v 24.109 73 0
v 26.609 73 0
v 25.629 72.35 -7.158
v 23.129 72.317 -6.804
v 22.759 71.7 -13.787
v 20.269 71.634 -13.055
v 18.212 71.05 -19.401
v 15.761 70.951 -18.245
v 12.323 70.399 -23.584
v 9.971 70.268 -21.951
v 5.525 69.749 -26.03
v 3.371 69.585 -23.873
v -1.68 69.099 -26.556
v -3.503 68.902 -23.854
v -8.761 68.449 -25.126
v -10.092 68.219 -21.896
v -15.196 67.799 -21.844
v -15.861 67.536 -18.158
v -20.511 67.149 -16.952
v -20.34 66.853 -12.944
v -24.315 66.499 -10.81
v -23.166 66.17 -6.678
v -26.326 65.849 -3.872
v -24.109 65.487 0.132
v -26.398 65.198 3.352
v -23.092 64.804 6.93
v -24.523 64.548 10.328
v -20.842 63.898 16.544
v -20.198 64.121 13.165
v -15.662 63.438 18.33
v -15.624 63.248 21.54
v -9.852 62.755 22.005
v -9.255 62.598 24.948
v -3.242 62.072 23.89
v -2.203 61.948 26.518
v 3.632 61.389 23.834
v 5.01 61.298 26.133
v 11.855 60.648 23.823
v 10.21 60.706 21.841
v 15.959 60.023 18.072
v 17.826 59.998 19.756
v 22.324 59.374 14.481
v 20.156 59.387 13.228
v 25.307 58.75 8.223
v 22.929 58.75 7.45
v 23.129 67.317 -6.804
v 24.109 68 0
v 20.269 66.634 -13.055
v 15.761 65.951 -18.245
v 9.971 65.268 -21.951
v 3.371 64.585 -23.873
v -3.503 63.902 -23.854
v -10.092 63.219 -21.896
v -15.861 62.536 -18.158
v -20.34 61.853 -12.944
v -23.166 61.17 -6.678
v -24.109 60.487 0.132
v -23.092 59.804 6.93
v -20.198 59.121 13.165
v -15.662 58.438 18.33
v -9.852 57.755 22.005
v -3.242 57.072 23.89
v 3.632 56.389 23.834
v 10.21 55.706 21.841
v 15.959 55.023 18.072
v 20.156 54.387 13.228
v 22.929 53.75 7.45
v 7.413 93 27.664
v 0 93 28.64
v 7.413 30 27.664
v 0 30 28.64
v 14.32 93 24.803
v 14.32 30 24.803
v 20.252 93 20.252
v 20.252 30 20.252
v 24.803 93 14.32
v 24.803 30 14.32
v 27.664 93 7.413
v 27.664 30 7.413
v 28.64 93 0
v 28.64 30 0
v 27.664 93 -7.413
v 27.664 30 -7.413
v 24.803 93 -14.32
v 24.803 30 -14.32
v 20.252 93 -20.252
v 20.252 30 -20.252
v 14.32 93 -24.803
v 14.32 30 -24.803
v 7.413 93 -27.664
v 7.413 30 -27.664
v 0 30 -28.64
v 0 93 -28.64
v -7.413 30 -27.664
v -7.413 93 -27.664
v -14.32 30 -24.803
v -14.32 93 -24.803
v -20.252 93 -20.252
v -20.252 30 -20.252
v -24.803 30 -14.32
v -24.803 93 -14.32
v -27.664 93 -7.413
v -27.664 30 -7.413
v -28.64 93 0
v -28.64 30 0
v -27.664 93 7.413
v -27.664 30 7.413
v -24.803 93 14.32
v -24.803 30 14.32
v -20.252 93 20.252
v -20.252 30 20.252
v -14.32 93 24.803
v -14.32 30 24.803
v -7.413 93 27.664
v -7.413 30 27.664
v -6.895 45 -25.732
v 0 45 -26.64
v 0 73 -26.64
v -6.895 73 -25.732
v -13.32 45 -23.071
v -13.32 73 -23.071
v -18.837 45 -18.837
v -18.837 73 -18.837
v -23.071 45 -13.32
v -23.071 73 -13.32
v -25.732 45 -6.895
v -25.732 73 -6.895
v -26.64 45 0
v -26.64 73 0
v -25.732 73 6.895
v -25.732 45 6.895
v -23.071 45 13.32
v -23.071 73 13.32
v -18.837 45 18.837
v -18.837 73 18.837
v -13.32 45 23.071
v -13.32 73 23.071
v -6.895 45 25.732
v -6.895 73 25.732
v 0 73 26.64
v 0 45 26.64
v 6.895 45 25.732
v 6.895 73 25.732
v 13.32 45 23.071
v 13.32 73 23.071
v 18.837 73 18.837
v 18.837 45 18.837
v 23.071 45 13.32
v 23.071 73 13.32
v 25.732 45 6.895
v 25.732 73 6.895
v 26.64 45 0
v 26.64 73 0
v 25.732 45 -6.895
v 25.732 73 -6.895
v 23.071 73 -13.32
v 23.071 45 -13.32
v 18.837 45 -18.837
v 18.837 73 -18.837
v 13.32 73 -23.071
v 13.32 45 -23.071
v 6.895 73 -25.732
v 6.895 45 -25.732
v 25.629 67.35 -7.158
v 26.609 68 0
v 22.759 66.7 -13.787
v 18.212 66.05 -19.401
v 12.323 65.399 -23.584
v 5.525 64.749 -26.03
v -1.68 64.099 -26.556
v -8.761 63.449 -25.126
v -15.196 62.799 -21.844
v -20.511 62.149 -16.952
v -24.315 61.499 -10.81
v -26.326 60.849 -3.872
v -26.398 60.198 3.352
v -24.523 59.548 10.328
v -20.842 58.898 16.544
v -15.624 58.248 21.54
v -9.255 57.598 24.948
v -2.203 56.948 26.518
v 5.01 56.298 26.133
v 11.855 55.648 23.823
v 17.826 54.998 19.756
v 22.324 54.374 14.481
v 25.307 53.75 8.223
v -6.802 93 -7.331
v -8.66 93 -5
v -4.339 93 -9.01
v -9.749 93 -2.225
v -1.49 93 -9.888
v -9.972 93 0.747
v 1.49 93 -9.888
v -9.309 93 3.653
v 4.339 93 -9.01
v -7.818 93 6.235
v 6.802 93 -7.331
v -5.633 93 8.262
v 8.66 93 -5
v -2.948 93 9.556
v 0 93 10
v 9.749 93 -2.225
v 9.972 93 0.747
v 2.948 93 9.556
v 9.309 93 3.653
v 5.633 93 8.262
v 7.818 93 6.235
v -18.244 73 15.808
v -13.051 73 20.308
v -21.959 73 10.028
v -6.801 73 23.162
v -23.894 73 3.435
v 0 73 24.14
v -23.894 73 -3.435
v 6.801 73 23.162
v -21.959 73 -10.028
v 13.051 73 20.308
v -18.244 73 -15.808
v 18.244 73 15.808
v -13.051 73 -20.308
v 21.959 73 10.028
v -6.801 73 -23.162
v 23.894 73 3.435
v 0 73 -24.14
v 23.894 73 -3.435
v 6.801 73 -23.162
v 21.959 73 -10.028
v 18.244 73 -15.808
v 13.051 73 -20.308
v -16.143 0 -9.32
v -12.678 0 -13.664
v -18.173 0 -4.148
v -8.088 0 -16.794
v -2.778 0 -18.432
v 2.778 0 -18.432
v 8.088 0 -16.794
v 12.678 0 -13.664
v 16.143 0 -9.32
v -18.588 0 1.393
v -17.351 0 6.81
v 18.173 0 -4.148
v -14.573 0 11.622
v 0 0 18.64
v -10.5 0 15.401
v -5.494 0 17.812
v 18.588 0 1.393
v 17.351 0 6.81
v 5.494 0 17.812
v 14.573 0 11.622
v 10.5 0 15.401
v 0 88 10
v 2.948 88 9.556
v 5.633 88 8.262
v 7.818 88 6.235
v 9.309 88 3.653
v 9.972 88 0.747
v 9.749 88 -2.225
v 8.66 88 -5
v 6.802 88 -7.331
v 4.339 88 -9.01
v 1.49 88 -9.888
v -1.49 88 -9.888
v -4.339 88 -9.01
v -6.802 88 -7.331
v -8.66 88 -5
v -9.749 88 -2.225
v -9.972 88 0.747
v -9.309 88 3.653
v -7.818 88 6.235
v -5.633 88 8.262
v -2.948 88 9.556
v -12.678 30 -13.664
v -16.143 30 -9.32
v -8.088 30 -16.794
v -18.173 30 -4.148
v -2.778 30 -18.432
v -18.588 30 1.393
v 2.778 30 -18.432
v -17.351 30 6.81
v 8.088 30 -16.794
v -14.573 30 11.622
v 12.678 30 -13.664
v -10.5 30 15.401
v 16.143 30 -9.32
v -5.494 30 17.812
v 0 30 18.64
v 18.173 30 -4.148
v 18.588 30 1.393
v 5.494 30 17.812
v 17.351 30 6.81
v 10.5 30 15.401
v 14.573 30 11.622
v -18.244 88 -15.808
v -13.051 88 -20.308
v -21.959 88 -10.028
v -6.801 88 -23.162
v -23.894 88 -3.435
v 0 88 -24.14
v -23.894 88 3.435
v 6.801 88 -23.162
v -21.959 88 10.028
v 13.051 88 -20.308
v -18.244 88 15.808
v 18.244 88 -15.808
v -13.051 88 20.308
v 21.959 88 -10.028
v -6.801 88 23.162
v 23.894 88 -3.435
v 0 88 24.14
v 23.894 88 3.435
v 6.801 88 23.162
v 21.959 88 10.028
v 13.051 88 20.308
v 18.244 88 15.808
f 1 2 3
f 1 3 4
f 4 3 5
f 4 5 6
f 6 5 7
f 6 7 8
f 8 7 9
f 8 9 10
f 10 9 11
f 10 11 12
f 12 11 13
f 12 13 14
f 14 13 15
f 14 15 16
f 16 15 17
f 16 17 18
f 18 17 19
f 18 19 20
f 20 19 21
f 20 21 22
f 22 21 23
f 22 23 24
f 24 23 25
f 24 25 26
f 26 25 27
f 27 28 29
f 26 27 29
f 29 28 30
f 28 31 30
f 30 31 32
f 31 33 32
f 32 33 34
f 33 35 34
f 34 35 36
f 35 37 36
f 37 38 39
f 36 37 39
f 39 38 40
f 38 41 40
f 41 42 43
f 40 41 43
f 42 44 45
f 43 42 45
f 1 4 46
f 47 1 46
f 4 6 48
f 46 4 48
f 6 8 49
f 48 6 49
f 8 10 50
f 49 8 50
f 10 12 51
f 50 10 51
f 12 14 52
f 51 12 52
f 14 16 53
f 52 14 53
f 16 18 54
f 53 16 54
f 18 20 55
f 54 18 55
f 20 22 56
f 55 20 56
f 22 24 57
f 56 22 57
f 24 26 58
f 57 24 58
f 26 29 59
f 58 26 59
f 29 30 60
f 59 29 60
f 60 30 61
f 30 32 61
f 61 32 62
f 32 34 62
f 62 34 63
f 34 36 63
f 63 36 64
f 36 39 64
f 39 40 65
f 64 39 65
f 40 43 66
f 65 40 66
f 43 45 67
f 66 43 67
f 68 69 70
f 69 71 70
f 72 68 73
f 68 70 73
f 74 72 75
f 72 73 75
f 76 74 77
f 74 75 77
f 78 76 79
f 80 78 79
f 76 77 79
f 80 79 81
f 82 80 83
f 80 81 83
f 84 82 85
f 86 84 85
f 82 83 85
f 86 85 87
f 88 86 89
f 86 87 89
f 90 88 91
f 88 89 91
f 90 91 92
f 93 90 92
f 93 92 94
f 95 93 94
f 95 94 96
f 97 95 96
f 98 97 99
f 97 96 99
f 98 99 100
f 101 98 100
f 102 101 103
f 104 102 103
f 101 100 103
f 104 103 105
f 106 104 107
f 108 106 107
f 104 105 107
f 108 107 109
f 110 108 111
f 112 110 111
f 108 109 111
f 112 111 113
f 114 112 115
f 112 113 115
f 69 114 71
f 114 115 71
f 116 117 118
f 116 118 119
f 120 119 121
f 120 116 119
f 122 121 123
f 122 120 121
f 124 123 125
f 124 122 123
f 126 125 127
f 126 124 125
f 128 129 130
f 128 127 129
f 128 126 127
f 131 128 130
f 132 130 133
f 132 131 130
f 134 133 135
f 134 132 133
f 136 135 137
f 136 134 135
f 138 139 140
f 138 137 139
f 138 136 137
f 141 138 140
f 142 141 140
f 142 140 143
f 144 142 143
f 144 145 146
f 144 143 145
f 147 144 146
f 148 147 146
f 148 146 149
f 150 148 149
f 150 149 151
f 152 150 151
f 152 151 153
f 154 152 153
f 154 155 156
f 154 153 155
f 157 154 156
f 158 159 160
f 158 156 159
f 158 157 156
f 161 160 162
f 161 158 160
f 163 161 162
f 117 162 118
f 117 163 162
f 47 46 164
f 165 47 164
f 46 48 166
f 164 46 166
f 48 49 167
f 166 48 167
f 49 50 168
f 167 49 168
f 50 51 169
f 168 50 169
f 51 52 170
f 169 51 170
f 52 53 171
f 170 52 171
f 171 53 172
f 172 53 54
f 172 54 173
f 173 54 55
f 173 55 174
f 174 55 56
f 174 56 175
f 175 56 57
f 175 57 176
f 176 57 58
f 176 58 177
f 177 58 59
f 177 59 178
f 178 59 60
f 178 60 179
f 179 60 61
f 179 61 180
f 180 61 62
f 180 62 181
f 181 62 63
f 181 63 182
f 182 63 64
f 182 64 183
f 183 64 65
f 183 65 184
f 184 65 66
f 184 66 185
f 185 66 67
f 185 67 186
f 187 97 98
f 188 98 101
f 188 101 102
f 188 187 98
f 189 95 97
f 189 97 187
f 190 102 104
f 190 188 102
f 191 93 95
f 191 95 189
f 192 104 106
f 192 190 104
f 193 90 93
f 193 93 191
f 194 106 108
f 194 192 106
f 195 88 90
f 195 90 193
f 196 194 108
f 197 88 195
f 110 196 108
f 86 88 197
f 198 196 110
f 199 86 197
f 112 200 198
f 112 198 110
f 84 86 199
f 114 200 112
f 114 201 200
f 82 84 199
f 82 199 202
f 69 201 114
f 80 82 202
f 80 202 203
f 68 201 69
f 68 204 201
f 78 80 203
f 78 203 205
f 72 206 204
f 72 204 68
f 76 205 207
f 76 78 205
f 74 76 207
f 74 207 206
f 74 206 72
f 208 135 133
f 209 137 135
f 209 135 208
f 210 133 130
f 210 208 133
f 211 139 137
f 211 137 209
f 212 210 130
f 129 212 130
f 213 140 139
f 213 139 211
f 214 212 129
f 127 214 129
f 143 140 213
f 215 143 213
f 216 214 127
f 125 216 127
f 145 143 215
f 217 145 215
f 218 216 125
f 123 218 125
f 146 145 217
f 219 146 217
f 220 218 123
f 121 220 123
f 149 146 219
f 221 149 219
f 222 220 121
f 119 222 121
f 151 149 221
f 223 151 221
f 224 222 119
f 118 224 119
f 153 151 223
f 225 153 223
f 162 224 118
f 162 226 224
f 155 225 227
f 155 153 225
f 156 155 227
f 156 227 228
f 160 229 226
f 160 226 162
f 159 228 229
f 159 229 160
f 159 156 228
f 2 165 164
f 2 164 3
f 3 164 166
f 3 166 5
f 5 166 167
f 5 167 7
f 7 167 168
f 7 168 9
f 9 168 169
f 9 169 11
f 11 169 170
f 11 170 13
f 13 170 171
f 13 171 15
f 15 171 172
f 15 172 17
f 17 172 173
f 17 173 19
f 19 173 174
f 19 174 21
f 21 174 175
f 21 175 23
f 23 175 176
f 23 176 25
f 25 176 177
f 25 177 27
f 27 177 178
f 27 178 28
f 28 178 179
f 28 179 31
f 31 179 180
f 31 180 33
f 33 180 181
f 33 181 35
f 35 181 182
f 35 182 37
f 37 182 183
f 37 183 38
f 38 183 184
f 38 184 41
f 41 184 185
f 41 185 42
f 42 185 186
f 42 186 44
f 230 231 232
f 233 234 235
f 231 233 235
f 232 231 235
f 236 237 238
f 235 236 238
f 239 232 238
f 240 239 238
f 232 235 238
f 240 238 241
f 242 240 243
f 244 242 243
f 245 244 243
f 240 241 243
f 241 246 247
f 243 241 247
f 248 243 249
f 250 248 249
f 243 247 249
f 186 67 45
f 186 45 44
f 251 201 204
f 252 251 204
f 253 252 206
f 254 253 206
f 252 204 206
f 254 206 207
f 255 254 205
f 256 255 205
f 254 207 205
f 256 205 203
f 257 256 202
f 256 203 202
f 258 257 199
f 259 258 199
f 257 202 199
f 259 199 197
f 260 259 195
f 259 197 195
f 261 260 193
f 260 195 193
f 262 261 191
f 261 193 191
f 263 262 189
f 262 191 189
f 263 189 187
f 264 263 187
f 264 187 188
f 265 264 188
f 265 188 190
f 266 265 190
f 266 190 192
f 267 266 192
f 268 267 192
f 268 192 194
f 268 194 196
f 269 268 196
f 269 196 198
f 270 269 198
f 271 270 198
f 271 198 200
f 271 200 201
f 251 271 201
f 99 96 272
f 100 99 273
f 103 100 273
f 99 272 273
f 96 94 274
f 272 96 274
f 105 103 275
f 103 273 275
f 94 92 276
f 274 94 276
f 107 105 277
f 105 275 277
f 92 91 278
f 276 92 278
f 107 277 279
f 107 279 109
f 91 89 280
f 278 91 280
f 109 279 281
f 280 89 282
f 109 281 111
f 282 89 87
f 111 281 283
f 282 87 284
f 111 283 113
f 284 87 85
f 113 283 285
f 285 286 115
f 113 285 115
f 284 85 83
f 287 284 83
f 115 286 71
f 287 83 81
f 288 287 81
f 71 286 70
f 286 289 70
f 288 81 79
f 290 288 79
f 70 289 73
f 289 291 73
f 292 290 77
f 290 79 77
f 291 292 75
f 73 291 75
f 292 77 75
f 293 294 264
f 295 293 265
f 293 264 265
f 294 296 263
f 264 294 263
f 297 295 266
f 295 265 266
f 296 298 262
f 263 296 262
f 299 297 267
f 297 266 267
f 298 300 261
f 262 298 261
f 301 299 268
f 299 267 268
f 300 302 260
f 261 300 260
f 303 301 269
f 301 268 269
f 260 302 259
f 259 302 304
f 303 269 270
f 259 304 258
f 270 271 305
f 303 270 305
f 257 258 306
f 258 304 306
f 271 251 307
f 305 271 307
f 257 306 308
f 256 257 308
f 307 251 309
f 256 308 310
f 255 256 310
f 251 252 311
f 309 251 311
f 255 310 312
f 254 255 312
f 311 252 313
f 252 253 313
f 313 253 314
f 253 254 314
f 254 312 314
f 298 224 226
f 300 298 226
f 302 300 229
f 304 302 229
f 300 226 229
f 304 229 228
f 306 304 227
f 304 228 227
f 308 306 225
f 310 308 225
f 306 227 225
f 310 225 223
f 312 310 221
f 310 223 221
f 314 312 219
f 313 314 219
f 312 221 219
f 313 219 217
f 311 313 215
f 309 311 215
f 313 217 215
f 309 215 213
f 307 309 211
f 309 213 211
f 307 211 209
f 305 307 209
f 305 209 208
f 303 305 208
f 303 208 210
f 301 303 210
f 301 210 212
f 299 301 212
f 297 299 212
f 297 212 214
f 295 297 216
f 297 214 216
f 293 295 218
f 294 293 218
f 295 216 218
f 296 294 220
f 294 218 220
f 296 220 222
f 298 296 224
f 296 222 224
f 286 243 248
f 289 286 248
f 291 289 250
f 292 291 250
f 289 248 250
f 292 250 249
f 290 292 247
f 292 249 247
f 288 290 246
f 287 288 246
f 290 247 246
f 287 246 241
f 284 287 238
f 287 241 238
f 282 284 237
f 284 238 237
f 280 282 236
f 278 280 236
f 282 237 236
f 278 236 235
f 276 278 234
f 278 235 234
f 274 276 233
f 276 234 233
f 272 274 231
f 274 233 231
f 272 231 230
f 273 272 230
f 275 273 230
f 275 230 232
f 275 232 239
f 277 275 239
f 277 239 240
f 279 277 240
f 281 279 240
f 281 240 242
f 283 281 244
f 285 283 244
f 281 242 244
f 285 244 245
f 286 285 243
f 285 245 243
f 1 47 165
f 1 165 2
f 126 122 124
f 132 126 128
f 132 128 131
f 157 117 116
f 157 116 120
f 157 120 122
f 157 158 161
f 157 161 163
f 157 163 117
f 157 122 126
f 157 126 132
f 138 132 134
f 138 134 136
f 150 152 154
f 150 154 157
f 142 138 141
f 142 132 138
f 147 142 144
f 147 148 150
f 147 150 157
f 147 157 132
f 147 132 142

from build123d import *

# Parameters (mm, degrees)
SKETCH1_R           = 18.64
BOSS_EXTRUDE2_DEPTH = 30
SKETCH2_R           = 28.64
BOSS_EXTRUDE3_DEPTH = 15
SKETCH3_R           = 28.64
SKETCH3_R_2         = 26.64
BOSS_EXTRUDE4_DEPTH = 45
CHAMFER1_SIZE       = 2
BOSS_EXTRUDE5_START = 88
SKETCH4_R           = 28.64
BOSS_EXTRUDE5_DEPTH = 5
CHAMFER2_SIZE       = 2
BOSS_EXTRUDE6_START = 15
SKETCH5_R           = 26.64
SKETCH5_R_2         = 24.14
BOSS_EXTRUDE6_DEPTH = 15
SWEEP2_PITCH        = 15
SWEEP2_HEIGHT       = 14.25
SWEEP2_RADIUS       = 25.39
SWEEP2_START_ANGLE  = 90
SKETCH14_W          = 2.5
SKETCH14_H          = 5
SKETCH15_R          = 10
CUT_EXTRUDE1_DEPTH  = 15


with BuildPart() as part:
    # Sketch1 → Boss-Extrude2 (new body)
    with BuildSketch(Plane(origin=(0, 0, 0), x_dir=(1, 0, 0), z_dir=(0, 1, 0))):
        with Locations(Location((0, 0, 0), (0, 0, 270))):
            Circle(SKETCH1_R)
    extrude(amount=BOSS_EXTRUDE2_DEPTH)

    # Sketch2 → Boss-Extrude3 (add)
    with BuildSketch(Plane(origin=(0, 30, 0), x_dir=(1, 0, 0), z_dir=(0, 1, 0))):
        with Locations(Location((0, 0, 0), (0, 0, 270))):
            Circle(SKETCH2_R)
    extrude(amount=BOSS_EXTRUDE3_DEPTH)

    # Sketch3 → Boss-Extrude4 (add)
    with BuildSketch(Plane(origin=(0, 45, 0), x_dir=(1, 0, 0), z_dir=(0, 1, 0))):
        with Locations(Location((0, 0, 0), (0, 0, 270))):
            Circle(SKETCH3_R)
        with Locations(Location((0, 0, 0), (0, 0, 90))):
            Circle(SKETCH3_R_2, mode=Mode.SUBTRACT)
    extrude(amount=BOSS_EXTRUDE4_DEPTH)

    # Chamfer1
    chamfer1_edges = [part.edges().sort_by_distance(p)[0] for p in [
        (0, 90, 26.64),
    ]]
    chamfer(chamfer1_edges, length=CHAMFER1_SIZE - 0.0001)  # a hair under: the kernel refuses the full size



with BuildPart() as body_2:
    # Sketch4 → Boss-Extrude5 (new body)
    with BuildSketch(Plane(origin=(0, 0, 0), x_dir=(1, 0, 0), z_dir=(0, 1, 0)).offset(BOSS_EXTRUDE5_START)):
        with Locations(Location((0, 0, 0), (0, 0, 270))):
            Circle(SKETCH4_R)
    extrude(amount=BOSS_EXTRUDE5_DEPTH)

    # Chamfer2
    chamfer2_edges = [body_2.edges().sort_by_distance(p)[0] for p in [
        (0, 88, -28.64),
    ]]
    chamfer(chamfer2_edges, length=CHAMFER2_SIZE)


with BuildPart() as part_1:
    add(part.part)

    add(body_2.part)  # Boss-Extrude6 merges body 2
    # Sketch5 → Boss-Extrude6 (add)
    with BuildSketch(Plane.XZ.offset(-88).offset(BOSS_EXTRUDE6_START)):
        with Locations(Location((0, 0, 0), (0, 0, 270))):
            Circle(SKETCH5_R)
        with Locations(Location((0, 0, 0), (0, 0, 270))):
            Circle(SKETCH5_R_2, mode=Mode.SUBTRACT)
    extrude(amount=-BOSS_EXTRUDE6_DEPTH)

    # Sketch15 → Cut-Extrude1 (cut)
    with BuildSketch(Plane(origin=(0, 93, 0), x_dir=(1, 0, 0), z_dir=(0, 1, 0))):
        with Locations(Location((0, 0, 0), (0, 0, 270))):
            Circle(SKETCH15_R)
    extrude(amount=-CUT_EXTRUDE1_DEPTH, mode=Mode.SUBTRACT)


with BuildPart() as body_2_2:
    # Sweep2: sweep along a helix
    with BuildLine() as sweep2_path:
        add(Helix(SWEEP2_PITCH, SWEEP2_HEIGHT, SWEEP2_RADIUS, center=(0, 73, 0), direction=(0, -1, 0), lefthand=True, mode=Mode.PRIVATE).rotate(Axis((0, 73, 0), (0, -1, 0)), SWEEP2_START_ANGLE))
    # Sketch14 → Sweep2 (sweep)
    with BuildSketch(Plane.XY):
        with Locations((25.359475185, 70.5)):
            Rectangle(SKETCH14_W, SKETCH14_H)
    sweep(path=sweep2_path.line, is_frenet=True)


solid = Compound([part_1.part, body_2_2.part])
